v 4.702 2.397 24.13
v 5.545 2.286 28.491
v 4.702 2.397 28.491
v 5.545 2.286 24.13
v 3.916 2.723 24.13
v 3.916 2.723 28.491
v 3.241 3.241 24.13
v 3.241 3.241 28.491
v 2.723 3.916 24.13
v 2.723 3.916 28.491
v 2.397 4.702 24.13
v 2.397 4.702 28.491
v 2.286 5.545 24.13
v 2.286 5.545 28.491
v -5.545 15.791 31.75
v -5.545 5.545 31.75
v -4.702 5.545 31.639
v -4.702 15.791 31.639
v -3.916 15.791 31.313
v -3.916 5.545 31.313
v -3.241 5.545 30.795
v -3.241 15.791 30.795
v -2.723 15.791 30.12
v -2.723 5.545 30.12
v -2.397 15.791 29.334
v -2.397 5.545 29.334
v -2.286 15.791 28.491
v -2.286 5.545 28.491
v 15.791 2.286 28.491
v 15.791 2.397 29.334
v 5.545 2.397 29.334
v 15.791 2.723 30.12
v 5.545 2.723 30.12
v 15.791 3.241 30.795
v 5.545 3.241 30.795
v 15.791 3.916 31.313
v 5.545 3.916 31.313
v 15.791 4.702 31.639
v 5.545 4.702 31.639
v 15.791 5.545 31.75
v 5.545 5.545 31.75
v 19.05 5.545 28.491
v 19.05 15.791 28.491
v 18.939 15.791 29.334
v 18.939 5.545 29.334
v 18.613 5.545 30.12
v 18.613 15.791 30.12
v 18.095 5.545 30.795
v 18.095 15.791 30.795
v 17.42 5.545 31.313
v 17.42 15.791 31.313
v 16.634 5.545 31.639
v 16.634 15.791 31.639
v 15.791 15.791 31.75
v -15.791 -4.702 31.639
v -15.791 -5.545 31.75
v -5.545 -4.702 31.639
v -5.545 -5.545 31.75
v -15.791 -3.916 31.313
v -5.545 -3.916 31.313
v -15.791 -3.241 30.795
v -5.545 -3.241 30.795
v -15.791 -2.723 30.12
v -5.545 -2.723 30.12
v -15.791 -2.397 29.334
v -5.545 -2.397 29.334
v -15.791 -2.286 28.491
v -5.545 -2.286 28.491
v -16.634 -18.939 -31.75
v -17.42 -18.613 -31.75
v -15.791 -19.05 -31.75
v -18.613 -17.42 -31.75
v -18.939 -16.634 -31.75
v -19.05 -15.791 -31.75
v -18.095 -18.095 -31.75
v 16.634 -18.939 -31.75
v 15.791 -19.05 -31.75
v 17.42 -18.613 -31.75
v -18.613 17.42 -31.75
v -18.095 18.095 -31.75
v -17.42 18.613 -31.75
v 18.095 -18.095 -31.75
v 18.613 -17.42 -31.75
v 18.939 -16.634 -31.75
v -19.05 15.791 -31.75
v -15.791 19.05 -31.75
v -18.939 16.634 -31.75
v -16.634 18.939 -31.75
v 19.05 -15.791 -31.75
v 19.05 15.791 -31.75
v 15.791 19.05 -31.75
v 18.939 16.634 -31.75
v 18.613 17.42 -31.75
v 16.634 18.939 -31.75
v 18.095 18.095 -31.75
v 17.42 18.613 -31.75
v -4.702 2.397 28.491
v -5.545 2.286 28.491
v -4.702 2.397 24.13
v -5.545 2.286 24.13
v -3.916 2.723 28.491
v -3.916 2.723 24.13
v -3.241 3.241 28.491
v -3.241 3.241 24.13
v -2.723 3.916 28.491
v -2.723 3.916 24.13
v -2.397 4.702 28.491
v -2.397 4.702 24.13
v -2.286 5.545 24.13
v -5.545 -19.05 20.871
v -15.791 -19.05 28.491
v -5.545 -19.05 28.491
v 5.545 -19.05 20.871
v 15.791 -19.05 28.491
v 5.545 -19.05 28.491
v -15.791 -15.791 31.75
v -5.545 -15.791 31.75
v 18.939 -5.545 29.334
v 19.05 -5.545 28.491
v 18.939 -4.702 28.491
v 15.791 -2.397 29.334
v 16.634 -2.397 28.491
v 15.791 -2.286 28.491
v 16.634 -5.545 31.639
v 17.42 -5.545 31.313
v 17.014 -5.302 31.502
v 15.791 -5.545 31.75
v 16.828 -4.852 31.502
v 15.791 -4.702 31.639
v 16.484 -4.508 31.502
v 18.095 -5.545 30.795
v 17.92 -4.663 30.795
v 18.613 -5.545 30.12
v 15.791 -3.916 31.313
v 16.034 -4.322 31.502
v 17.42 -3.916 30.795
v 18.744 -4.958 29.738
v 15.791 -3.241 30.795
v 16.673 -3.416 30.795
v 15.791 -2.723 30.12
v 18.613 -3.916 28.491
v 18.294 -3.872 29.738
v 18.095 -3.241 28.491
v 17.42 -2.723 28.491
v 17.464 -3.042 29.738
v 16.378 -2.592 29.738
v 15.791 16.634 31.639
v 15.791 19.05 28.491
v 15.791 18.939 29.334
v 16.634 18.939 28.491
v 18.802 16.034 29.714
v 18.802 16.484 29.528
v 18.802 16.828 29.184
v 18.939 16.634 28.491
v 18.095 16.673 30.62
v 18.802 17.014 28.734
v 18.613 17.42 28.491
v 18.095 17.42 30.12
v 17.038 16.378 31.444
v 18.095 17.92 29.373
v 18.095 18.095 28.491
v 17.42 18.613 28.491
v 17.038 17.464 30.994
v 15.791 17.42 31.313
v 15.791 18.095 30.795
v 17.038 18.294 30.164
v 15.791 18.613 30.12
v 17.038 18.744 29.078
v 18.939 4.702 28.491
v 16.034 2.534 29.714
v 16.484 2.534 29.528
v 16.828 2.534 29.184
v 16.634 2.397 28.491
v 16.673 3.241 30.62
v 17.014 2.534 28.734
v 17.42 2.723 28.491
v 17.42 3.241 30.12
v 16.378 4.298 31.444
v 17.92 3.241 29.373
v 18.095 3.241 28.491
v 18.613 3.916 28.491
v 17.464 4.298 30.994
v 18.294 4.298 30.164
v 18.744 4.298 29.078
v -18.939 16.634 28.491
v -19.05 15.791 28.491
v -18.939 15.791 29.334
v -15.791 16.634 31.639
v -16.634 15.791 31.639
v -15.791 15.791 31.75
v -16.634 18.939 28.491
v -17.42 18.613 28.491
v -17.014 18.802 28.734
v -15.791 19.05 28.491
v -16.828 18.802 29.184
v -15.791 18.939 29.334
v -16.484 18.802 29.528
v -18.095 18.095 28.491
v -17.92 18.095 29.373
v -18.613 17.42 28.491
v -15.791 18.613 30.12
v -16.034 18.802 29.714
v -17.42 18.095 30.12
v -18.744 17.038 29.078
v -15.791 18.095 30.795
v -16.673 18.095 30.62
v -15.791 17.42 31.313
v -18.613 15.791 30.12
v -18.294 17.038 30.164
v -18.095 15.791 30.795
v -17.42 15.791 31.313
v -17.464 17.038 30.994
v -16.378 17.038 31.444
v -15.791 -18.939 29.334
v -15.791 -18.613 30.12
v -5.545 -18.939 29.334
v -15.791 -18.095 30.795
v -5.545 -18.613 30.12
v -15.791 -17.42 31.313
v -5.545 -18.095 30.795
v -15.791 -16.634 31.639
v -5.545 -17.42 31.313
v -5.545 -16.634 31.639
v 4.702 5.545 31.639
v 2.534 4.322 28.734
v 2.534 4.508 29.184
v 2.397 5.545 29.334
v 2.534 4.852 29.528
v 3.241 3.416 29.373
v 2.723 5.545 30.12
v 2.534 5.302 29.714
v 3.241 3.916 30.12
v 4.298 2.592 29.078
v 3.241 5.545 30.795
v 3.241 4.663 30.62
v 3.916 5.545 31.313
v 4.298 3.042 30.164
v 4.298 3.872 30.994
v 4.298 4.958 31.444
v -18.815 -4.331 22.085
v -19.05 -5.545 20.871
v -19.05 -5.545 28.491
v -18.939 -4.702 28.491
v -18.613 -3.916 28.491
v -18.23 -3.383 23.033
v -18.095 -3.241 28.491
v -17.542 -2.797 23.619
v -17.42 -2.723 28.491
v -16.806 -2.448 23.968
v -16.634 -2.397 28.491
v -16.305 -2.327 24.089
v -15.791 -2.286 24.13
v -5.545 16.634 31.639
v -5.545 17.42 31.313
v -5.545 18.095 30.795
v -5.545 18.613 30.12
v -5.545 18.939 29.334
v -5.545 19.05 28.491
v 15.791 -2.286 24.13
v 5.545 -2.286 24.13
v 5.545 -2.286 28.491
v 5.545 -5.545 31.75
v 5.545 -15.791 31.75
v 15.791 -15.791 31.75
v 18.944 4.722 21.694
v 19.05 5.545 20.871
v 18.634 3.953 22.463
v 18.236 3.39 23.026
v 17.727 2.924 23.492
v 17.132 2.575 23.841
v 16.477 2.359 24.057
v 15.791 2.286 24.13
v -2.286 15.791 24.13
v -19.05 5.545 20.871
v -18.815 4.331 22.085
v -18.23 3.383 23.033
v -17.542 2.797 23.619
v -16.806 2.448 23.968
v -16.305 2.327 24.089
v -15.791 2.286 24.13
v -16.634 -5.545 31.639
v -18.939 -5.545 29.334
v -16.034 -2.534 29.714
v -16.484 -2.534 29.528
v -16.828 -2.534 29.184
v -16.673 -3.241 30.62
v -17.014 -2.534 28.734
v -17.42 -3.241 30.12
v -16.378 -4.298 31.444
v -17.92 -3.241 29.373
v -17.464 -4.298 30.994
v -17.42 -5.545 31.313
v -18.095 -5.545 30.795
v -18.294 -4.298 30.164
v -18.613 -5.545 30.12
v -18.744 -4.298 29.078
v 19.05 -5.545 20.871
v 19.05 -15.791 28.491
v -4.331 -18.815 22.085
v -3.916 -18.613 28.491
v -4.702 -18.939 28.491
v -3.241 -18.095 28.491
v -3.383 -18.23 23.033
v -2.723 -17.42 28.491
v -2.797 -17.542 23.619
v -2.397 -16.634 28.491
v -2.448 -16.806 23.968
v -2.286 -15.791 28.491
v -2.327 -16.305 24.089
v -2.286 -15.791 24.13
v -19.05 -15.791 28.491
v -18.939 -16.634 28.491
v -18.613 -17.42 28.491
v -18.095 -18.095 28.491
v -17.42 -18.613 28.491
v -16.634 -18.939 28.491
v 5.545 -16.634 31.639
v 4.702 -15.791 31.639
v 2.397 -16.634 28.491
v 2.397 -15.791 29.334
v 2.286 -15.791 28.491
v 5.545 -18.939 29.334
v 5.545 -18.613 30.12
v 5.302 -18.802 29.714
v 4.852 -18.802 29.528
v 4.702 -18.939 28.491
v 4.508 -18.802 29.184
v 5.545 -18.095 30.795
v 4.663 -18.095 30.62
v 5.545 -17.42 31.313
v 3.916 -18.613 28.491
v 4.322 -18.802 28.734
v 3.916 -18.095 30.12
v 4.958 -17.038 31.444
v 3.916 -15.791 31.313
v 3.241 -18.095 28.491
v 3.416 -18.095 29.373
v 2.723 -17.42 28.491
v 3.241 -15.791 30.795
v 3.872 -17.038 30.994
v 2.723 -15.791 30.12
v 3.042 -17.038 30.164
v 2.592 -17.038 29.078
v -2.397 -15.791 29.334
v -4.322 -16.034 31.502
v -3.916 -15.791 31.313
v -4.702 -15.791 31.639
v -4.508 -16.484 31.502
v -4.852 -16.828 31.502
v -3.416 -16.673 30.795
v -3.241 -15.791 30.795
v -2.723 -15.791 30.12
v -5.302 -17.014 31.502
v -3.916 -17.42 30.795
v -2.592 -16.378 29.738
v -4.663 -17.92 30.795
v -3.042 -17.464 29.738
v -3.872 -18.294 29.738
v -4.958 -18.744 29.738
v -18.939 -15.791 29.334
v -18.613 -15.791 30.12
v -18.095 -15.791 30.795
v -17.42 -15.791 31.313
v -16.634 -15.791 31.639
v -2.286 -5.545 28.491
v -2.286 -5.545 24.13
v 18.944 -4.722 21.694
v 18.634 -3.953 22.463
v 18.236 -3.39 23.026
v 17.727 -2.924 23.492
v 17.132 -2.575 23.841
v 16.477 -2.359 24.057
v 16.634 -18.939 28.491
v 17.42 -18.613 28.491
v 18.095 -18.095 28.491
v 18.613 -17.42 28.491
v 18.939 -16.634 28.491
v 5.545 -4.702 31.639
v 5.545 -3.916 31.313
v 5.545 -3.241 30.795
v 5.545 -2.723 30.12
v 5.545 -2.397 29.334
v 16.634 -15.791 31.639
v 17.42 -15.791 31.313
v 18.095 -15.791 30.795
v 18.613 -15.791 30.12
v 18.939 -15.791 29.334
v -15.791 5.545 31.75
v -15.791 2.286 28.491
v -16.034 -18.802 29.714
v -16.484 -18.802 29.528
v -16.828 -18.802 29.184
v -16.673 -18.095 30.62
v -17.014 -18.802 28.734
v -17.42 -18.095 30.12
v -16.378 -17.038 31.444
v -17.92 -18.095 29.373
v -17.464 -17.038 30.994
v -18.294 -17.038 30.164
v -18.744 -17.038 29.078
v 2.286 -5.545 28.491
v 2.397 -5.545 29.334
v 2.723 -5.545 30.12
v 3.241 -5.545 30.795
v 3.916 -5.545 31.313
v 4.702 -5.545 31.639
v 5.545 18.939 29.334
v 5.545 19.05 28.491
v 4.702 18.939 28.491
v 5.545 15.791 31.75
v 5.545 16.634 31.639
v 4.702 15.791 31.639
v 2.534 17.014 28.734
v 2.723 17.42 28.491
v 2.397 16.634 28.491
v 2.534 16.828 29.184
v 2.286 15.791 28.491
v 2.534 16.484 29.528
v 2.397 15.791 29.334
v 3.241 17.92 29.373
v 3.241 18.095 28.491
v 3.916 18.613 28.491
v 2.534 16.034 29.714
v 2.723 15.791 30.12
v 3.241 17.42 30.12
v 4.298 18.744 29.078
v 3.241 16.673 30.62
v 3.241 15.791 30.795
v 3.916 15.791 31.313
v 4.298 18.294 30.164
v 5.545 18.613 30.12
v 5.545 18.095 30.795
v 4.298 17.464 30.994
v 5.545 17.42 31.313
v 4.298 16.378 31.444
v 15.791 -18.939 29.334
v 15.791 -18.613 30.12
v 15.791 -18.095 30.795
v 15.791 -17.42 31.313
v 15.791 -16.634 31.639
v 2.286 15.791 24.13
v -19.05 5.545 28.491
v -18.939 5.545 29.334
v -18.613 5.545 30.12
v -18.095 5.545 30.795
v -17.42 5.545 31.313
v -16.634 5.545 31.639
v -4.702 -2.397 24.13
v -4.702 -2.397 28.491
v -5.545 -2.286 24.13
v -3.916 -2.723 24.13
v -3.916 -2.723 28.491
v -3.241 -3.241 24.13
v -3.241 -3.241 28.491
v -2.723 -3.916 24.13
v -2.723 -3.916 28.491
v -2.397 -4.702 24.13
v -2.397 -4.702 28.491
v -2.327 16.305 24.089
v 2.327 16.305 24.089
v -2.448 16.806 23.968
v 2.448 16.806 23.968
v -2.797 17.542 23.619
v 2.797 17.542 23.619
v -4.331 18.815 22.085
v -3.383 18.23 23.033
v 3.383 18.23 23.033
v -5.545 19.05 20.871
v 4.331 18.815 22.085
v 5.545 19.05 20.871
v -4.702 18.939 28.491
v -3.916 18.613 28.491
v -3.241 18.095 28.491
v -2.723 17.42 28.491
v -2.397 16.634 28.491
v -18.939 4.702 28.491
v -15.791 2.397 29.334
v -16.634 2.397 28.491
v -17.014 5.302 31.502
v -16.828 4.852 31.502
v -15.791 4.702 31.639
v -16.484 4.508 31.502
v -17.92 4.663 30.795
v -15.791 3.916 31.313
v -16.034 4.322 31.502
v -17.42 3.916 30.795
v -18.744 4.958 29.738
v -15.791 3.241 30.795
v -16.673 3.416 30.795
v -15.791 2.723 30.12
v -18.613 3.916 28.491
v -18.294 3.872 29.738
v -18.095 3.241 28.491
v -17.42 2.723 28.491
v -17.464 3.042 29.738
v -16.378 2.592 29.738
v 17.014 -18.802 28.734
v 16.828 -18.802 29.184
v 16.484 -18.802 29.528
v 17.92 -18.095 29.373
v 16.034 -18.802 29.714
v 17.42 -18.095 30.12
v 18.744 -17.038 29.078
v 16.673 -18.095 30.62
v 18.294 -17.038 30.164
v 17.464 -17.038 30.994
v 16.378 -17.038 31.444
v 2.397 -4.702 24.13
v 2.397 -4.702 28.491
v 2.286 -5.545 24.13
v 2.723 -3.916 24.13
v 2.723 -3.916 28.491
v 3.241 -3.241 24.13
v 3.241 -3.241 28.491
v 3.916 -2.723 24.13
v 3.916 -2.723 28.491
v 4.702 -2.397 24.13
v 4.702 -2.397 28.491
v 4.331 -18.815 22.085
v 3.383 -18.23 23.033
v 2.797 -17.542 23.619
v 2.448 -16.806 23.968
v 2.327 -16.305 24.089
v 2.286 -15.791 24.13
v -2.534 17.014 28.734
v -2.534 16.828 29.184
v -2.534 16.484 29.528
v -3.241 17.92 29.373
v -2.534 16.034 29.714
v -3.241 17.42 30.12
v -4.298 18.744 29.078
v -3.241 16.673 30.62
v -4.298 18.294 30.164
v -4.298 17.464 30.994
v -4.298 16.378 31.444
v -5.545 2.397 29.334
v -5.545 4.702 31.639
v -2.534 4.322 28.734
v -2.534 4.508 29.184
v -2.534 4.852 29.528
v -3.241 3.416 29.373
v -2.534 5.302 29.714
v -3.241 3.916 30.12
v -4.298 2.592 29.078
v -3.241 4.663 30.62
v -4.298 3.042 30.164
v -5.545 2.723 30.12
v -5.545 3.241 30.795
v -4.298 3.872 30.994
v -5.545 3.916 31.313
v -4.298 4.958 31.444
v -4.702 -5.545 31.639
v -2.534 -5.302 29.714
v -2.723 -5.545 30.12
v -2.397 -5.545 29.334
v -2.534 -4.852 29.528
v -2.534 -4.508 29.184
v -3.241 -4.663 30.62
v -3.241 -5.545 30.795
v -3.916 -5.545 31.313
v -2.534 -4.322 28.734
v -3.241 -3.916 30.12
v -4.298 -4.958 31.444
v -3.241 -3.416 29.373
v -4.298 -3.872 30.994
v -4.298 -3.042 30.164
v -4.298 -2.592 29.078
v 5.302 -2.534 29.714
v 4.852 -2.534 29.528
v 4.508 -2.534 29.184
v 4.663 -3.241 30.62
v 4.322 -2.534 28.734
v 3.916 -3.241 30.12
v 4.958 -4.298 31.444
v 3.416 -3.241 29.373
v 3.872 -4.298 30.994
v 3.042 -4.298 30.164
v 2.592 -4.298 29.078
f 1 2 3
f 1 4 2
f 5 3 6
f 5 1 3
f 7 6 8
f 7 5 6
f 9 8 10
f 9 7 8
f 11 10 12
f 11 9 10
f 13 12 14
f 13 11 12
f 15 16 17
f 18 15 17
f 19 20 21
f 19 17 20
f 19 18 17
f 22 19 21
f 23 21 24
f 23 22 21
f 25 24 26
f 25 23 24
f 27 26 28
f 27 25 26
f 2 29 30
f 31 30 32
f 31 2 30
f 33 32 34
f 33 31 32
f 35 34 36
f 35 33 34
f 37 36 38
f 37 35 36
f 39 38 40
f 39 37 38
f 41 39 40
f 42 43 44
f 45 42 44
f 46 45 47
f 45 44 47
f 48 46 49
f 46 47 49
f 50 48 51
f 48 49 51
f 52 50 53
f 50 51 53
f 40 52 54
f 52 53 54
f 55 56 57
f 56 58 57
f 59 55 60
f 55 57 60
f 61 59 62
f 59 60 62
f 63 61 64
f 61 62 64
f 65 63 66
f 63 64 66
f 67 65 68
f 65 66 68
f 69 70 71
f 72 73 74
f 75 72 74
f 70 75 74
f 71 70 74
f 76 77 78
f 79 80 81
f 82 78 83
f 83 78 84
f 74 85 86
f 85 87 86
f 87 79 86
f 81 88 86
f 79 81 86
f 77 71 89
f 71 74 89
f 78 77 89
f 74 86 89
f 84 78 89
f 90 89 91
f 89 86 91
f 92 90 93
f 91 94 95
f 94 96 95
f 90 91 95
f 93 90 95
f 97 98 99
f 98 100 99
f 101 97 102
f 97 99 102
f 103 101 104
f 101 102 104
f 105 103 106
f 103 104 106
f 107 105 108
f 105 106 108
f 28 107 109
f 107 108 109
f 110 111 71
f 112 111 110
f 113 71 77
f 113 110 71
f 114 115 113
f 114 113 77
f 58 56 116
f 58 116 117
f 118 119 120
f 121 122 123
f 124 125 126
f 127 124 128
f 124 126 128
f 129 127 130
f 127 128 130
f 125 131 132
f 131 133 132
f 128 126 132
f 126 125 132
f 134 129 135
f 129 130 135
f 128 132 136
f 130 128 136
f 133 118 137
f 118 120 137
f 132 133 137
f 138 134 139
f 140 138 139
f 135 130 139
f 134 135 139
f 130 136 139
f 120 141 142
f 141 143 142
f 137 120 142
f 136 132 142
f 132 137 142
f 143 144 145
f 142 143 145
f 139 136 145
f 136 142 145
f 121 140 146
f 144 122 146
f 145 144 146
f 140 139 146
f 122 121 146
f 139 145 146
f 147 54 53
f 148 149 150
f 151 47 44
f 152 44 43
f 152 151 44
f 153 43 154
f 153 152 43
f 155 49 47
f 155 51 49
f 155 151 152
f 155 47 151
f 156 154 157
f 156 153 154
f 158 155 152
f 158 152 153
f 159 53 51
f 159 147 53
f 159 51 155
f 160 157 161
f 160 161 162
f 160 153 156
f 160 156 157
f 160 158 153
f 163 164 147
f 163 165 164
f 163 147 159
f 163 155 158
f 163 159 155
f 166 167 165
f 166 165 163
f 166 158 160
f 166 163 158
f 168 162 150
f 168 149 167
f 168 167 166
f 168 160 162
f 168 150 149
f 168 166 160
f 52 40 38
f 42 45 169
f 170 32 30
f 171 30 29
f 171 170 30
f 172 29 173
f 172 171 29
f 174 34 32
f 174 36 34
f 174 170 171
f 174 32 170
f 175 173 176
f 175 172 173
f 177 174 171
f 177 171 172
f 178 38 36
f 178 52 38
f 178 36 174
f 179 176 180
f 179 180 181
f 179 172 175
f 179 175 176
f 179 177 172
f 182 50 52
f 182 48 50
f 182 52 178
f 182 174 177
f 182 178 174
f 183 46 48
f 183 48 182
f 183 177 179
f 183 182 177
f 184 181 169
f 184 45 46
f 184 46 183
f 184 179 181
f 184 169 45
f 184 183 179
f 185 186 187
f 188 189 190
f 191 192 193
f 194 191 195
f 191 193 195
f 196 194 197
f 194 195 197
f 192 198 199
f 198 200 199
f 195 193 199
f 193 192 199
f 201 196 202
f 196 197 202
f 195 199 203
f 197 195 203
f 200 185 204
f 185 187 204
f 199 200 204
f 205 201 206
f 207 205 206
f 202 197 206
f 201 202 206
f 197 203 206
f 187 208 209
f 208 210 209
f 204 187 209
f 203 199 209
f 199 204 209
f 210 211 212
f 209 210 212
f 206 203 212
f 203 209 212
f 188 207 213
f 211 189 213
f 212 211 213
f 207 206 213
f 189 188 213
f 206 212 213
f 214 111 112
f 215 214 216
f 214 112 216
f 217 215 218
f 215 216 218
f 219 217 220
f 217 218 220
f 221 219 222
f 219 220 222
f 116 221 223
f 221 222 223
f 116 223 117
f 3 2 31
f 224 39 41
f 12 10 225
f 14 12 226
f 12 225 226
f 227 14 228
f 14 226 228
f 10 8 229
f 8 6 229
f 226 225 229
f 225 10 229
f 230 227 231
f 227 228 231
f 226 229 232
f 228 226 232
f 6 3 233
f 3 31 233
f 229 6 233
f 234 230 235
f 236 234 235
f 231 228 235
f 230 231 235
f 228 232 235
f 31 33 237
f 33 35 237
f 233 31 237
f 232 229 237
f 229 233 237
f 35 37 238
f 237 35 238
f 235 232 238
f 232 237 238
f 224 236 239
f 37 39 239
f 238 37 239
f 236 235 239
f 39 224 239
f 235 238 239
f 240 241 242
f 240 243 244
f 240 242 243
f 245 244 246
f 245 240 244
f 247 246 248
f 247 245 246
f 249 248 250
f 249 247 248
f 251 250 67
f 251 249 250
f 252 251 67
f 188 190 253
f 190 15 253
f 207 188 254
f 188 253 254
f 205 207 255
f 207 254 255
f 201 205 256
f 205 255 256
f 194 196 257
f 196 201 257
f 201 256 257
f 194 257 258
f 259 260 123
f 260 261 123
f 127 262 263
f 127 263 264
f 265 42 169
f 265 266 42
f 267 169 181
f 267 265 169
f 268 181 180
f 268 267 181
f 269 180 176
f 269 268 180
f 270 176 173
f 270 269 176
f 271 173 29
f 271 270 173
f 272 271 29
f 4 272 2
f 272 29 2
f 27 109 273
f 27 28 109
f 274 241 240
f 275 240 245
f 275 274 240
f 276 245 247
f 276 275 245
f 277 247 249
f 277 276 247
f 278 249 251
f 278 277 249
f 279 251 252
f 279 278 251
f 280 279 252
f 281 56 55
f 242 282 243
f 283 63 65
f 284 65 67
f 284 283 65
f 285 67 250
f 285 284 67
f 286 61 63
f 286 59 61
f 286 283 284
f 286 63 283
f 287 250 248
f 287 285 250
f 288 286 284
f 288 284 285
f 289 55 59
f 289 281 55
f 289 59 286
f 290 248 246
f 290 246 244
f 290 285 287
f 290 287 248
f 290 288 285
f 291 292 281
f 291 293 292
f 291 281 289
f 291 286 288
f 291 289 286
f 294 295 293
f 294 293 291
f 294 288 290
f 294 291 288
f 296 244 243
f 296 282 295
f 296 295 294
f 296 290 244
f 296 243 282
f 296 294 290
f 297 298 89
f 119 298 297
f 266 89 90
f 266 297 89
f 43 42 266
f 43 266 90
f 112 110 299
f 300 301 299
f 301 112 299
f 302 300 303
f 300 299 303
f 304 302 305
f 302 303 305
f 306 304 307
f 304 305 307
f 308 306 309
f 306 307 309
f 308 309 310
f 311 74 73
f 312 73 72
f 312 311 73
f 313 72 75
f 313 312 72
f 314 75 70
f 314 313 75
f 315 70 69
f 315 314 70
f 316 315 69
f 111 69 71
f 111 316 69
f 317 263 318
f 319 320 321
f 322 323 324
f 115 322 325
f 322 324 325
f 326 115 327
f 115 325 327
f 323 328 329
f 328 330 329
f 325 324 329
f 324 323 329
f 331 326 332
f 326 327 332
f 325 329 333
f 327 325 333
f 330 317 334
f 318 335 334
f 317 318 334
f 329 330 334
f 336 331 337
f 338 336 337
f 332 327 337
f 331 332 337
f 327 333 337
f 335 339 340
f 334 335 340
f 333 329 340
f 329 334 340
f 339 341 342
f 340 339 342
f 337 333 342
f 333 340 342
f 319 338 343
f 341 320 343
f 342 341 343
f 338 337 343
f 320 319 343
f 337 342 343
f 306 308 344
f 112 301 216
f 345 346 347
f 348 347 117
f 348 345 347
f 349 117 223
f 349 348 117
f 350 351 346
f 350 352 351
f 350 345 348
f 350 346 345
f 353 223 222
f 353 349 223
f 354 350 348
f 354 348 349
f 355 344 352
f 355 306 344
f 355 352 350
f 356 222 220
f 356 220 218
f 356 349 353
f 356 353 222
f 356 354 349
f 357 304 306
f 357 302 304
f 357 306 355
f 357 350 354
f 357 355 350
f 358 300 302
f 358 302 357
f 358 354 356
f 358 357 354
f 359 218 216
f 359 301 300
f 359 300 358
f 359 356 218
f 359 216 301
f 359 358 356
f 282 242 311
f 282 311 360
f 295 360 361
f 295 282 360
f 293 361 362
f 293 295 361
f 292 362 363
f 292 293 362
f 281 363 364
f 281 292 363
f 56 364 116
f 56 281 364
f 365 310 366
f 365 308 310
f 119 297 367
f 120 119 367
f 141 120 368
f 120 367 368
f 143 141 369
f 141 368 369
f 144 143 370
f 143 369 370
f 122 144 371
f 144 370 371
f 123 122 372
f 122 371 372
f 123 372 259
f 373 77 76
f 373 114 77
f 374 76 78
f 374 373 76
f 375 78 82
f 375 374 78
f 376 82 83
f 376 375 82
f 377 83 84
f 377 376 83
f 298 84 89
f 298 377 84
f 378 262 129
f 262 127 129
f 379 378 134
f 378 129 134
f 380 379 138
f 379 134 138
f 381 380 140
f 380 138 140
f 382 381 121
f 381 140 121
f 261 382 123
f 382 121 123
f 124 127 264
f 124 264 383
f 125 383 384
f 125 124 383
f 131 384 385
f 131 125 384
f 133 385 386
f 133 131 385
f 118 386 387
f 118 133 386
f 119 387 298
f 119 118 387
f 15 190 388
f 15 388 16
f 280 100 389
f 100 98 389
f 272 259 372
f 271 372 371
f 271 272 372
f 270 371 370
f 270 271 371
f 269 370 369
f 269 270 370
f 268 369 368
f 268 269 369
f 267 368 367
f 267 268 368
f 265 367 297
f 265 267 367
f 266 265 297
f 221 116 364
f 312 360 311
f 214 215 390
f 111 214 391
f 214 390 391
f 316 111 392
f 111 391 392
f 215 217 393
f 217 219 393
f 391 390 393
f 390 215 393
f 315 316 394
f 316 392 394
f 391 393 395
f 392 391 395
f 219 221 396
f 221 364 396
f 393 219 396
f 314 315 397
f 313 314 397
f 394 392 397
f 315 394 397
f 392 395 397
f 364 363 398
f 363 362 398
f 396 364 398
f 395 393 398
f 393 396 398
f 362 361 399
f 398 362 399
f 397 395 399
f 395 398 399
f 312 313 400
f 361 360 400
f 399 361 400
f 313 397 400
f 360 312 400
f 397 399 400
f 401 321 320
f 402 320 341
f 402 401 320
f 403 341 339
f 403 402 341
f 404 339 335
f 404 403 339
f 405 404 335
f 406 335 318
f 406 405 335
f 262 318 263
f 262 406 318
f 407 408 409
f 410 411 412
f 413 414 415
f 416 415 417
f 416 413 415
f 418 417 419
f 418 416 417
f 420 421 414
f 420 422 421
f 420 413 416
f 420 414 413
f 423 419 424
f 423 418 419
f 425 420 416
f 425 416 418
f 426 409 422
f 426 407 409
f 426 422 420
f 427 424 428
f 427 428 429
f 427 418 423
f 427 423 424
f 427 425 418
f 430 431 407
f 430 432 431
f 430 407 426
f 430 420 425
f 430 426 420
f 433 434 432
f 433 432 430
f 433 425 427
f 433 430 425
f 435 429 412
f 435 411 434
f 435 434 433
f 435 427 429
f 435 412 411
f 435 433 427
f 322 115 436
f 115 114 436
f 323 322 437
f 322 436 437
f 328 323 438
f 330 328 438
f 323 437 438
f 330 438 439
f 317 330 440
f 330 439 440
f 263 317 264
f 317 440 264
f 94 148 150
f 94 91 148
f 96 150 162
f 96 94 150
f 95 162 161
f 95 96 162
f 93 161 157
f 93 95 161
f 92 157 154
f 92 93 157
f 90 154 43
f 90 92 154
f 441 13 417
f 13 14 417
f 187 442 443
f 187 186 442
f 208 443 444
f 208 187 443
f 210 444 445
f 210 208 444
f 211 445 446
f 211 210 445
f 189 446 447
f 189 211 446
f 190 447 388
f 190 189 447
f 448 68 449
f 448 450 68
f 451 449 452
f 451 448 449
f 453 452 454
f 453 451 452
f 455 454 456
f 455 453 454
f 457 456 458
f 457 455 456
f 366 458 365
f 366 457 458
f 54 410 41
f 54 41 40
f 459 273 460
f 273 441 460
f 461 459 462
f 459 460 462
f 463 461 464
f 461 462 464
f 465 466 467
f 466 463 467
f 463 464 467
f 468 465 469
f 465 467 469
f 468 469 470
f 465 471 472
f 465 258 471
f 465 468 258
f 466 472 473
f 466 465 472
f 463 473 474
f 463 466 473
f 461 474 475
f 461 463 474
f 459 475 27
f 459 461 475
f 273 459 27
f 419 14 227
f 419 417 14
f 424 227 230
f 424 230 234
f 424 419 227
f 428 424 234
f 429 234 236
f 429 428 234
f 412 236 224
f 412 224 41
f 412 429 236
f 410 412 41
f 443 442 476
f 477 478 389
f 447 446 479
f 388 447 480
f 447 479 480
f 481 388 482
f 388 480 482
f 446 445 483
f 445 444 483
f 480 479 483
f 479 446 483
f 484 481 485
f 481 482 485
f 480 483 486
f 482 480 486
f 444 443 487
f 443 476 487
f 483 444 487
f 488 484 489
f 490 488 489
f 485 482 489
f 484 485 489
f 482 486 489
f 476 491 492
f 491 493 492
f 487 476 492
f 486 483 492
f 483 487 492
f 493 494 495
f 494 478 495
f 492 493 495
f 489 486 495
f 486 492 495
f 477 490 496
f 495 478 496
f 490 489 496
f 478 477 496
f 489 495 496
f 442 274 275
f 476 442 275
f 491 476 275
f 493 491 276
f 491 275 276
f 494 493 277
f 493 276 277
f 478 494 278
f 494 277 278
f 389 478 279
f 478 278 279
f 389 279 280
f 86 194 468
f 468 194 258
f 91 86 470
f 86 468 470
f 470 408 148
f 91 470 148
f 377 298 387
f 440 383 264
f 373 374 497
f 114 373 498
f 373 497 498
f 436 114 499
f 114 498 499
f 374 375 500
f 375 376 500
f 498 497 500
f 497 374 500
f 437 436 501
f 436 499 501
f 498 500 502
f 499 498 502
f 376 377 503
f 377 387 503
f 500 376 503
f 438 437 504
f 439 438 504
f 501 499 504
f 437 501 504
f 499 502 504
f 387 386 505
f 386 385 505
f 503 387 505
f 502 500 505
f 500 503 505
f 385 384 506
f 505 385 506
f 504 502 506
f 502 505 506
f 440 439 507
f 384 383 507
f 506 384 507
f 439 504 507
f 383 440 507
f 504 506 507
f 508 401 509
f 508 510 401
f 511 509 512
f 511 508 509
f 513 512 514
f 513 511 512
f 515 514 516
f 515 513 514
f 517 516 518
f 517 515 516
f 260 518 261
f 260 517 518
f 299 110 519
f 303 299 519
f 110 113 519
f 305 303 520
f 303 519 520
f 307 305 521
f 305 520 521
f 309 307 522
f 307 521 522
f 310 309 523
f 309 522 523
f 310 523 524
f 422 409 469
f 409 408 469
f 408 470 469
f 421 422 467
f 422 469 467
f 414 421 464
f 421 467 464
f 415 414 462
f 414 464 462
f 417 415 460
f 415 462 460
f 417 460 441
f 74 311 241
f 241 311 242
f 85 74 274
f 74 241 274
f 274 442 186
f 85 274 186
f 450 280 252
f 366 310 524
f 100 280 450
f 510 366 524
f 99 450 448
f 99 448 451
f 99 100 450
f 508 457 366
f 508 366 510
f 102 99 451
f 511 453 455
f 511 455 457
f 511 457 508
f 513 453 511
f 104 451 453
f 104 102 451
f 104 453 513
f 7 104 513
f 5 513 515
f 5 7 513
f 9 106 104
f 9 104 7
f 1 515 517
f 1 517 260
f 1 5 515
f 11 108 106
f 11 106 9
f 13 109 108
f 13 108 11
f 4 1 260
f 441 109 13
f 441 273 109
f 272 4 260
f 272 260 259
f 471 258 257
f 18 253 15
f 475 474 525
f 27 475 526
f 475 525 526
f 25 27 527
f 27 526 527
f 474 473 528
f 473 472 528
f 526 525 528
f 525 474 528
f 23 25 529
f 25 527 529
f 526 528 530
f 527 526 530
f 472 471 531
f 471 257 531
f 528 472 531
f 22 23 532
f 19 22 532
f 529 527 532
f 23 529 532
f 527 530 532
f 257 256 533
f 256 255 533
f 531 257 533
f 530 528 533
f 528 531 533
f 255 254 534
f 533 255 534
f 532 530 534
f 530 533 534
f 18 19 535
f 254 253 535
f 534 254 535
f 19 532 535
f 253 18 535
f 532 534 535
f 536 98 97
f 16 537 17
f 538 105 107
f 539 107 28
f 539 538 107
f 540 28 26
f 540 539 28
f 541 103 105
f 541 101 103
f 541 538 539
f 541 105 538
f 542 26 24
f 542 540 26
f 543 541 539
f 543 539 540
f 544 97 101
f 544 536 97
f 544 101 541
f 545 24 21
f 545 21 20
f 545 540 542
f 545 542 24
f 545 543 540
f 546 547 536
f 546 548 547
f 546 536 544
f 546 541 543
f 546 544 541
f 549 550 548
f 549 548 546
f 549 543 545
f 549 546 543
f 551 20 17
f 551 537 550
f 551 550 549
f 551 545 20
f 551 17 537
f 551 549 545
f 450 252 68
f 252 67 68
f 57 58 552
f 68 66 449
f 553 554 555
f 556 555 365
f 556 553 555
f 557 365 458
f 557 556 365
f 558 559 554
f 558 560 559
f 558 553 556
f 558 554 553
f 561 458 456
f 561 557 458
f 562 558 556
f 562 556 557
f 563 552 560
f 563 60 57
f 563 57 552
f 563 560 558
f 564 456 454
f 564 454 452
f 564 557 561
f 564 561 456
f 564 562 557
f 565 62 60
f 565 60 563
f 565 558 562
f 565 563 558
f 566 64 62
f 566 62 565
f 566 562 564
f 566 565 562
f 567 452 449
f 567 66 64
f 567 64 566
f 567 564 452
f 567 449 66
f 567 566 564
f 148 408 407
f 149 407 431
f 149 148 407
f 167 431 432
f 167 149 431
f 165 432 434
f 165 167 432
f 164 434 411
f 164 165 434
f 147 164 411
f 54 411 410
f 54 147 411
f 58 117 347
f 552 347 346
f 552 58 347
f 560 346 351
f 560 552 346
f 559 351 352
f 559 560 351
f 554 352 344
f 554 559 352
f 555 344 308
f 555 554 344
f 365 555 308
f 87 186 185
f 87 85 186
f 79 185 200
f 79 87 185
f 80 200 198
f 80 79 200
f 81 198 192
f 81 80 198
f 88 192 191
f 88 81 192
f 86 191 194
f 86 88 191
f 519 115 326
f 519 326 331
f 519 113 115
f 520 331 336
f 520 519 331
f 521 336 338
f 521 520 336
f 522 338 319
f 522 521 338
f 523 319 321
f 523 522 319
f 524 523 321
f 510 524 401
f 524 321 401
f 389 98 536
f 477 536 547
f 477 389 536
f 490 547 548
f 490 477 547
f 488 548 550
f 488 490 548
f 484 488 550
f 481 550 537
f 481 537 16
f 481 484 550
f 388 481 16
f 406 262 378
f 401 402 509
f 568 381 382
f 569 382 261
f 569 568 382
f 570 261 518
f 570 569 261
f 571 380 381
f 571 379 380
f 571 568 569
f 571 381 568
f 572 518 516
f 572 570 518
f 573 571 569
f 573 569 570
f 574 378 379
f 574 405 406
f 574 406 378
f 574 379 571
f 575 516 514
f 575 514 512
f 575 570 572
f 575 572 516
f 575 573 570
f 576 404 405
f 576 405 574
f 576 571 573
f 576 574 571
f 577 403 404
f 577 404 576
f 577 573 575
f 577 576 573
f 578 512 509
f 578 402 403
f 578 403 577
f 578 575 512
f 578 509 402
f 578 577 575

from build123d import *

# Parameters (mm, degrees)
F0_W     = 38.1
F0_H     = 38.1
F2_DEPTH = 31.75
F4_W     = 4.572
F4_H     = 16.764
F3_W     = 16.764
F3_H     = 4.572
F3_W_2   = 4.572
F3_H_2   = 16.764
F5_DEPTH = 7.62
F6_R     = 3.2591265624


with BuildPart() as f2:
    # F0 (on Top) → F2 (new body, symmetric)
    with BuildSketch(Plane.XY):
        Rectangle(F0_W, F0_H)
    extrude(amount=F2_DEPTH, both=True)

    # F4 (on face) + F3 (on face) → F5 (cut)
    with BuildSketch(Plane.XY.offset(31.75)):
        with Locations((0, 10.668)):
            Rectangle(F4_W, F4_H)
    with BuildSketch(Plane.XY.offset(31.75)):
        with Locations((-10.668, 0)):
            Rectangle(F3_W, F3_H)
        Rectangle(F3_W_2, F3_H)
        with Locations((10.668, 0)):
            Rectangle(F3_W, F3_H)
        with Locations((0, -10.668)):
            Rectangle(F3_W_2, F3_H_2)
    extrude(amount=-F5_DEPTH, mode=Mode.SUBTRACT)

    # F6
    f6_edges = [f2.edges().sort_by_distance(p)[0] for p in [
        (10.668, 19.05, 31.75),
        (19.05, 10.668, 31.75),
        (19.05, 19.05, 0),
        (2.286, -10.668, 31.75),
        (10.668, 2.286, 31.75),
        (19.05, 0, 24.13),
        (19.05, 2.286, 27.94),
        (19.05, -2.286, 27.94),
        (19.05, -10.668, 31.75),
        (19.05, -19.05, 0),
        (10.668, -19.05, 31.75),
        (2.286, -19.05, 27.94),
        (0, -19.05, 24.13),
        (-2.286, -19.05, 27.94),
        (10.668, -2.286, 31.75),
        (-19.05, -10.668, 31.75),
        (-10.668, -2.286, 31.75),
        (-2.286, -10.668, 31.75),
        (-10.668, -19.05, 31.75),
        (-19.05, -2.286, 27.94),
        (-19.05, 0, 24.13),
        (-19.05, 2.286, 27.94),
        (-19.05, 10.668, 31.75),
        (-19.05, 19.05, 0),
        (-10.668, 19.05, 31.75),
        (-10.668, 2.286, 31.75),
        (-2.286, 19.05, 27.94),
        (2.286, 19.05, 27.94),
        (0, 19.05, 24.13),
        (-2.286, 2.286, 27.94),
        (-2.286, -2.286, 27.94),
        (2.286, 2.286, 27.94),
        (2.286, -2.286, 27.94),
        (-19.05, -19.05, 0),
        (-2.286, 10.668, 31.75),
        (2.286, 10.668, 31.75),
    ]]
    fillet(f6_edges, radius=F6_R)


solid = f2.part
